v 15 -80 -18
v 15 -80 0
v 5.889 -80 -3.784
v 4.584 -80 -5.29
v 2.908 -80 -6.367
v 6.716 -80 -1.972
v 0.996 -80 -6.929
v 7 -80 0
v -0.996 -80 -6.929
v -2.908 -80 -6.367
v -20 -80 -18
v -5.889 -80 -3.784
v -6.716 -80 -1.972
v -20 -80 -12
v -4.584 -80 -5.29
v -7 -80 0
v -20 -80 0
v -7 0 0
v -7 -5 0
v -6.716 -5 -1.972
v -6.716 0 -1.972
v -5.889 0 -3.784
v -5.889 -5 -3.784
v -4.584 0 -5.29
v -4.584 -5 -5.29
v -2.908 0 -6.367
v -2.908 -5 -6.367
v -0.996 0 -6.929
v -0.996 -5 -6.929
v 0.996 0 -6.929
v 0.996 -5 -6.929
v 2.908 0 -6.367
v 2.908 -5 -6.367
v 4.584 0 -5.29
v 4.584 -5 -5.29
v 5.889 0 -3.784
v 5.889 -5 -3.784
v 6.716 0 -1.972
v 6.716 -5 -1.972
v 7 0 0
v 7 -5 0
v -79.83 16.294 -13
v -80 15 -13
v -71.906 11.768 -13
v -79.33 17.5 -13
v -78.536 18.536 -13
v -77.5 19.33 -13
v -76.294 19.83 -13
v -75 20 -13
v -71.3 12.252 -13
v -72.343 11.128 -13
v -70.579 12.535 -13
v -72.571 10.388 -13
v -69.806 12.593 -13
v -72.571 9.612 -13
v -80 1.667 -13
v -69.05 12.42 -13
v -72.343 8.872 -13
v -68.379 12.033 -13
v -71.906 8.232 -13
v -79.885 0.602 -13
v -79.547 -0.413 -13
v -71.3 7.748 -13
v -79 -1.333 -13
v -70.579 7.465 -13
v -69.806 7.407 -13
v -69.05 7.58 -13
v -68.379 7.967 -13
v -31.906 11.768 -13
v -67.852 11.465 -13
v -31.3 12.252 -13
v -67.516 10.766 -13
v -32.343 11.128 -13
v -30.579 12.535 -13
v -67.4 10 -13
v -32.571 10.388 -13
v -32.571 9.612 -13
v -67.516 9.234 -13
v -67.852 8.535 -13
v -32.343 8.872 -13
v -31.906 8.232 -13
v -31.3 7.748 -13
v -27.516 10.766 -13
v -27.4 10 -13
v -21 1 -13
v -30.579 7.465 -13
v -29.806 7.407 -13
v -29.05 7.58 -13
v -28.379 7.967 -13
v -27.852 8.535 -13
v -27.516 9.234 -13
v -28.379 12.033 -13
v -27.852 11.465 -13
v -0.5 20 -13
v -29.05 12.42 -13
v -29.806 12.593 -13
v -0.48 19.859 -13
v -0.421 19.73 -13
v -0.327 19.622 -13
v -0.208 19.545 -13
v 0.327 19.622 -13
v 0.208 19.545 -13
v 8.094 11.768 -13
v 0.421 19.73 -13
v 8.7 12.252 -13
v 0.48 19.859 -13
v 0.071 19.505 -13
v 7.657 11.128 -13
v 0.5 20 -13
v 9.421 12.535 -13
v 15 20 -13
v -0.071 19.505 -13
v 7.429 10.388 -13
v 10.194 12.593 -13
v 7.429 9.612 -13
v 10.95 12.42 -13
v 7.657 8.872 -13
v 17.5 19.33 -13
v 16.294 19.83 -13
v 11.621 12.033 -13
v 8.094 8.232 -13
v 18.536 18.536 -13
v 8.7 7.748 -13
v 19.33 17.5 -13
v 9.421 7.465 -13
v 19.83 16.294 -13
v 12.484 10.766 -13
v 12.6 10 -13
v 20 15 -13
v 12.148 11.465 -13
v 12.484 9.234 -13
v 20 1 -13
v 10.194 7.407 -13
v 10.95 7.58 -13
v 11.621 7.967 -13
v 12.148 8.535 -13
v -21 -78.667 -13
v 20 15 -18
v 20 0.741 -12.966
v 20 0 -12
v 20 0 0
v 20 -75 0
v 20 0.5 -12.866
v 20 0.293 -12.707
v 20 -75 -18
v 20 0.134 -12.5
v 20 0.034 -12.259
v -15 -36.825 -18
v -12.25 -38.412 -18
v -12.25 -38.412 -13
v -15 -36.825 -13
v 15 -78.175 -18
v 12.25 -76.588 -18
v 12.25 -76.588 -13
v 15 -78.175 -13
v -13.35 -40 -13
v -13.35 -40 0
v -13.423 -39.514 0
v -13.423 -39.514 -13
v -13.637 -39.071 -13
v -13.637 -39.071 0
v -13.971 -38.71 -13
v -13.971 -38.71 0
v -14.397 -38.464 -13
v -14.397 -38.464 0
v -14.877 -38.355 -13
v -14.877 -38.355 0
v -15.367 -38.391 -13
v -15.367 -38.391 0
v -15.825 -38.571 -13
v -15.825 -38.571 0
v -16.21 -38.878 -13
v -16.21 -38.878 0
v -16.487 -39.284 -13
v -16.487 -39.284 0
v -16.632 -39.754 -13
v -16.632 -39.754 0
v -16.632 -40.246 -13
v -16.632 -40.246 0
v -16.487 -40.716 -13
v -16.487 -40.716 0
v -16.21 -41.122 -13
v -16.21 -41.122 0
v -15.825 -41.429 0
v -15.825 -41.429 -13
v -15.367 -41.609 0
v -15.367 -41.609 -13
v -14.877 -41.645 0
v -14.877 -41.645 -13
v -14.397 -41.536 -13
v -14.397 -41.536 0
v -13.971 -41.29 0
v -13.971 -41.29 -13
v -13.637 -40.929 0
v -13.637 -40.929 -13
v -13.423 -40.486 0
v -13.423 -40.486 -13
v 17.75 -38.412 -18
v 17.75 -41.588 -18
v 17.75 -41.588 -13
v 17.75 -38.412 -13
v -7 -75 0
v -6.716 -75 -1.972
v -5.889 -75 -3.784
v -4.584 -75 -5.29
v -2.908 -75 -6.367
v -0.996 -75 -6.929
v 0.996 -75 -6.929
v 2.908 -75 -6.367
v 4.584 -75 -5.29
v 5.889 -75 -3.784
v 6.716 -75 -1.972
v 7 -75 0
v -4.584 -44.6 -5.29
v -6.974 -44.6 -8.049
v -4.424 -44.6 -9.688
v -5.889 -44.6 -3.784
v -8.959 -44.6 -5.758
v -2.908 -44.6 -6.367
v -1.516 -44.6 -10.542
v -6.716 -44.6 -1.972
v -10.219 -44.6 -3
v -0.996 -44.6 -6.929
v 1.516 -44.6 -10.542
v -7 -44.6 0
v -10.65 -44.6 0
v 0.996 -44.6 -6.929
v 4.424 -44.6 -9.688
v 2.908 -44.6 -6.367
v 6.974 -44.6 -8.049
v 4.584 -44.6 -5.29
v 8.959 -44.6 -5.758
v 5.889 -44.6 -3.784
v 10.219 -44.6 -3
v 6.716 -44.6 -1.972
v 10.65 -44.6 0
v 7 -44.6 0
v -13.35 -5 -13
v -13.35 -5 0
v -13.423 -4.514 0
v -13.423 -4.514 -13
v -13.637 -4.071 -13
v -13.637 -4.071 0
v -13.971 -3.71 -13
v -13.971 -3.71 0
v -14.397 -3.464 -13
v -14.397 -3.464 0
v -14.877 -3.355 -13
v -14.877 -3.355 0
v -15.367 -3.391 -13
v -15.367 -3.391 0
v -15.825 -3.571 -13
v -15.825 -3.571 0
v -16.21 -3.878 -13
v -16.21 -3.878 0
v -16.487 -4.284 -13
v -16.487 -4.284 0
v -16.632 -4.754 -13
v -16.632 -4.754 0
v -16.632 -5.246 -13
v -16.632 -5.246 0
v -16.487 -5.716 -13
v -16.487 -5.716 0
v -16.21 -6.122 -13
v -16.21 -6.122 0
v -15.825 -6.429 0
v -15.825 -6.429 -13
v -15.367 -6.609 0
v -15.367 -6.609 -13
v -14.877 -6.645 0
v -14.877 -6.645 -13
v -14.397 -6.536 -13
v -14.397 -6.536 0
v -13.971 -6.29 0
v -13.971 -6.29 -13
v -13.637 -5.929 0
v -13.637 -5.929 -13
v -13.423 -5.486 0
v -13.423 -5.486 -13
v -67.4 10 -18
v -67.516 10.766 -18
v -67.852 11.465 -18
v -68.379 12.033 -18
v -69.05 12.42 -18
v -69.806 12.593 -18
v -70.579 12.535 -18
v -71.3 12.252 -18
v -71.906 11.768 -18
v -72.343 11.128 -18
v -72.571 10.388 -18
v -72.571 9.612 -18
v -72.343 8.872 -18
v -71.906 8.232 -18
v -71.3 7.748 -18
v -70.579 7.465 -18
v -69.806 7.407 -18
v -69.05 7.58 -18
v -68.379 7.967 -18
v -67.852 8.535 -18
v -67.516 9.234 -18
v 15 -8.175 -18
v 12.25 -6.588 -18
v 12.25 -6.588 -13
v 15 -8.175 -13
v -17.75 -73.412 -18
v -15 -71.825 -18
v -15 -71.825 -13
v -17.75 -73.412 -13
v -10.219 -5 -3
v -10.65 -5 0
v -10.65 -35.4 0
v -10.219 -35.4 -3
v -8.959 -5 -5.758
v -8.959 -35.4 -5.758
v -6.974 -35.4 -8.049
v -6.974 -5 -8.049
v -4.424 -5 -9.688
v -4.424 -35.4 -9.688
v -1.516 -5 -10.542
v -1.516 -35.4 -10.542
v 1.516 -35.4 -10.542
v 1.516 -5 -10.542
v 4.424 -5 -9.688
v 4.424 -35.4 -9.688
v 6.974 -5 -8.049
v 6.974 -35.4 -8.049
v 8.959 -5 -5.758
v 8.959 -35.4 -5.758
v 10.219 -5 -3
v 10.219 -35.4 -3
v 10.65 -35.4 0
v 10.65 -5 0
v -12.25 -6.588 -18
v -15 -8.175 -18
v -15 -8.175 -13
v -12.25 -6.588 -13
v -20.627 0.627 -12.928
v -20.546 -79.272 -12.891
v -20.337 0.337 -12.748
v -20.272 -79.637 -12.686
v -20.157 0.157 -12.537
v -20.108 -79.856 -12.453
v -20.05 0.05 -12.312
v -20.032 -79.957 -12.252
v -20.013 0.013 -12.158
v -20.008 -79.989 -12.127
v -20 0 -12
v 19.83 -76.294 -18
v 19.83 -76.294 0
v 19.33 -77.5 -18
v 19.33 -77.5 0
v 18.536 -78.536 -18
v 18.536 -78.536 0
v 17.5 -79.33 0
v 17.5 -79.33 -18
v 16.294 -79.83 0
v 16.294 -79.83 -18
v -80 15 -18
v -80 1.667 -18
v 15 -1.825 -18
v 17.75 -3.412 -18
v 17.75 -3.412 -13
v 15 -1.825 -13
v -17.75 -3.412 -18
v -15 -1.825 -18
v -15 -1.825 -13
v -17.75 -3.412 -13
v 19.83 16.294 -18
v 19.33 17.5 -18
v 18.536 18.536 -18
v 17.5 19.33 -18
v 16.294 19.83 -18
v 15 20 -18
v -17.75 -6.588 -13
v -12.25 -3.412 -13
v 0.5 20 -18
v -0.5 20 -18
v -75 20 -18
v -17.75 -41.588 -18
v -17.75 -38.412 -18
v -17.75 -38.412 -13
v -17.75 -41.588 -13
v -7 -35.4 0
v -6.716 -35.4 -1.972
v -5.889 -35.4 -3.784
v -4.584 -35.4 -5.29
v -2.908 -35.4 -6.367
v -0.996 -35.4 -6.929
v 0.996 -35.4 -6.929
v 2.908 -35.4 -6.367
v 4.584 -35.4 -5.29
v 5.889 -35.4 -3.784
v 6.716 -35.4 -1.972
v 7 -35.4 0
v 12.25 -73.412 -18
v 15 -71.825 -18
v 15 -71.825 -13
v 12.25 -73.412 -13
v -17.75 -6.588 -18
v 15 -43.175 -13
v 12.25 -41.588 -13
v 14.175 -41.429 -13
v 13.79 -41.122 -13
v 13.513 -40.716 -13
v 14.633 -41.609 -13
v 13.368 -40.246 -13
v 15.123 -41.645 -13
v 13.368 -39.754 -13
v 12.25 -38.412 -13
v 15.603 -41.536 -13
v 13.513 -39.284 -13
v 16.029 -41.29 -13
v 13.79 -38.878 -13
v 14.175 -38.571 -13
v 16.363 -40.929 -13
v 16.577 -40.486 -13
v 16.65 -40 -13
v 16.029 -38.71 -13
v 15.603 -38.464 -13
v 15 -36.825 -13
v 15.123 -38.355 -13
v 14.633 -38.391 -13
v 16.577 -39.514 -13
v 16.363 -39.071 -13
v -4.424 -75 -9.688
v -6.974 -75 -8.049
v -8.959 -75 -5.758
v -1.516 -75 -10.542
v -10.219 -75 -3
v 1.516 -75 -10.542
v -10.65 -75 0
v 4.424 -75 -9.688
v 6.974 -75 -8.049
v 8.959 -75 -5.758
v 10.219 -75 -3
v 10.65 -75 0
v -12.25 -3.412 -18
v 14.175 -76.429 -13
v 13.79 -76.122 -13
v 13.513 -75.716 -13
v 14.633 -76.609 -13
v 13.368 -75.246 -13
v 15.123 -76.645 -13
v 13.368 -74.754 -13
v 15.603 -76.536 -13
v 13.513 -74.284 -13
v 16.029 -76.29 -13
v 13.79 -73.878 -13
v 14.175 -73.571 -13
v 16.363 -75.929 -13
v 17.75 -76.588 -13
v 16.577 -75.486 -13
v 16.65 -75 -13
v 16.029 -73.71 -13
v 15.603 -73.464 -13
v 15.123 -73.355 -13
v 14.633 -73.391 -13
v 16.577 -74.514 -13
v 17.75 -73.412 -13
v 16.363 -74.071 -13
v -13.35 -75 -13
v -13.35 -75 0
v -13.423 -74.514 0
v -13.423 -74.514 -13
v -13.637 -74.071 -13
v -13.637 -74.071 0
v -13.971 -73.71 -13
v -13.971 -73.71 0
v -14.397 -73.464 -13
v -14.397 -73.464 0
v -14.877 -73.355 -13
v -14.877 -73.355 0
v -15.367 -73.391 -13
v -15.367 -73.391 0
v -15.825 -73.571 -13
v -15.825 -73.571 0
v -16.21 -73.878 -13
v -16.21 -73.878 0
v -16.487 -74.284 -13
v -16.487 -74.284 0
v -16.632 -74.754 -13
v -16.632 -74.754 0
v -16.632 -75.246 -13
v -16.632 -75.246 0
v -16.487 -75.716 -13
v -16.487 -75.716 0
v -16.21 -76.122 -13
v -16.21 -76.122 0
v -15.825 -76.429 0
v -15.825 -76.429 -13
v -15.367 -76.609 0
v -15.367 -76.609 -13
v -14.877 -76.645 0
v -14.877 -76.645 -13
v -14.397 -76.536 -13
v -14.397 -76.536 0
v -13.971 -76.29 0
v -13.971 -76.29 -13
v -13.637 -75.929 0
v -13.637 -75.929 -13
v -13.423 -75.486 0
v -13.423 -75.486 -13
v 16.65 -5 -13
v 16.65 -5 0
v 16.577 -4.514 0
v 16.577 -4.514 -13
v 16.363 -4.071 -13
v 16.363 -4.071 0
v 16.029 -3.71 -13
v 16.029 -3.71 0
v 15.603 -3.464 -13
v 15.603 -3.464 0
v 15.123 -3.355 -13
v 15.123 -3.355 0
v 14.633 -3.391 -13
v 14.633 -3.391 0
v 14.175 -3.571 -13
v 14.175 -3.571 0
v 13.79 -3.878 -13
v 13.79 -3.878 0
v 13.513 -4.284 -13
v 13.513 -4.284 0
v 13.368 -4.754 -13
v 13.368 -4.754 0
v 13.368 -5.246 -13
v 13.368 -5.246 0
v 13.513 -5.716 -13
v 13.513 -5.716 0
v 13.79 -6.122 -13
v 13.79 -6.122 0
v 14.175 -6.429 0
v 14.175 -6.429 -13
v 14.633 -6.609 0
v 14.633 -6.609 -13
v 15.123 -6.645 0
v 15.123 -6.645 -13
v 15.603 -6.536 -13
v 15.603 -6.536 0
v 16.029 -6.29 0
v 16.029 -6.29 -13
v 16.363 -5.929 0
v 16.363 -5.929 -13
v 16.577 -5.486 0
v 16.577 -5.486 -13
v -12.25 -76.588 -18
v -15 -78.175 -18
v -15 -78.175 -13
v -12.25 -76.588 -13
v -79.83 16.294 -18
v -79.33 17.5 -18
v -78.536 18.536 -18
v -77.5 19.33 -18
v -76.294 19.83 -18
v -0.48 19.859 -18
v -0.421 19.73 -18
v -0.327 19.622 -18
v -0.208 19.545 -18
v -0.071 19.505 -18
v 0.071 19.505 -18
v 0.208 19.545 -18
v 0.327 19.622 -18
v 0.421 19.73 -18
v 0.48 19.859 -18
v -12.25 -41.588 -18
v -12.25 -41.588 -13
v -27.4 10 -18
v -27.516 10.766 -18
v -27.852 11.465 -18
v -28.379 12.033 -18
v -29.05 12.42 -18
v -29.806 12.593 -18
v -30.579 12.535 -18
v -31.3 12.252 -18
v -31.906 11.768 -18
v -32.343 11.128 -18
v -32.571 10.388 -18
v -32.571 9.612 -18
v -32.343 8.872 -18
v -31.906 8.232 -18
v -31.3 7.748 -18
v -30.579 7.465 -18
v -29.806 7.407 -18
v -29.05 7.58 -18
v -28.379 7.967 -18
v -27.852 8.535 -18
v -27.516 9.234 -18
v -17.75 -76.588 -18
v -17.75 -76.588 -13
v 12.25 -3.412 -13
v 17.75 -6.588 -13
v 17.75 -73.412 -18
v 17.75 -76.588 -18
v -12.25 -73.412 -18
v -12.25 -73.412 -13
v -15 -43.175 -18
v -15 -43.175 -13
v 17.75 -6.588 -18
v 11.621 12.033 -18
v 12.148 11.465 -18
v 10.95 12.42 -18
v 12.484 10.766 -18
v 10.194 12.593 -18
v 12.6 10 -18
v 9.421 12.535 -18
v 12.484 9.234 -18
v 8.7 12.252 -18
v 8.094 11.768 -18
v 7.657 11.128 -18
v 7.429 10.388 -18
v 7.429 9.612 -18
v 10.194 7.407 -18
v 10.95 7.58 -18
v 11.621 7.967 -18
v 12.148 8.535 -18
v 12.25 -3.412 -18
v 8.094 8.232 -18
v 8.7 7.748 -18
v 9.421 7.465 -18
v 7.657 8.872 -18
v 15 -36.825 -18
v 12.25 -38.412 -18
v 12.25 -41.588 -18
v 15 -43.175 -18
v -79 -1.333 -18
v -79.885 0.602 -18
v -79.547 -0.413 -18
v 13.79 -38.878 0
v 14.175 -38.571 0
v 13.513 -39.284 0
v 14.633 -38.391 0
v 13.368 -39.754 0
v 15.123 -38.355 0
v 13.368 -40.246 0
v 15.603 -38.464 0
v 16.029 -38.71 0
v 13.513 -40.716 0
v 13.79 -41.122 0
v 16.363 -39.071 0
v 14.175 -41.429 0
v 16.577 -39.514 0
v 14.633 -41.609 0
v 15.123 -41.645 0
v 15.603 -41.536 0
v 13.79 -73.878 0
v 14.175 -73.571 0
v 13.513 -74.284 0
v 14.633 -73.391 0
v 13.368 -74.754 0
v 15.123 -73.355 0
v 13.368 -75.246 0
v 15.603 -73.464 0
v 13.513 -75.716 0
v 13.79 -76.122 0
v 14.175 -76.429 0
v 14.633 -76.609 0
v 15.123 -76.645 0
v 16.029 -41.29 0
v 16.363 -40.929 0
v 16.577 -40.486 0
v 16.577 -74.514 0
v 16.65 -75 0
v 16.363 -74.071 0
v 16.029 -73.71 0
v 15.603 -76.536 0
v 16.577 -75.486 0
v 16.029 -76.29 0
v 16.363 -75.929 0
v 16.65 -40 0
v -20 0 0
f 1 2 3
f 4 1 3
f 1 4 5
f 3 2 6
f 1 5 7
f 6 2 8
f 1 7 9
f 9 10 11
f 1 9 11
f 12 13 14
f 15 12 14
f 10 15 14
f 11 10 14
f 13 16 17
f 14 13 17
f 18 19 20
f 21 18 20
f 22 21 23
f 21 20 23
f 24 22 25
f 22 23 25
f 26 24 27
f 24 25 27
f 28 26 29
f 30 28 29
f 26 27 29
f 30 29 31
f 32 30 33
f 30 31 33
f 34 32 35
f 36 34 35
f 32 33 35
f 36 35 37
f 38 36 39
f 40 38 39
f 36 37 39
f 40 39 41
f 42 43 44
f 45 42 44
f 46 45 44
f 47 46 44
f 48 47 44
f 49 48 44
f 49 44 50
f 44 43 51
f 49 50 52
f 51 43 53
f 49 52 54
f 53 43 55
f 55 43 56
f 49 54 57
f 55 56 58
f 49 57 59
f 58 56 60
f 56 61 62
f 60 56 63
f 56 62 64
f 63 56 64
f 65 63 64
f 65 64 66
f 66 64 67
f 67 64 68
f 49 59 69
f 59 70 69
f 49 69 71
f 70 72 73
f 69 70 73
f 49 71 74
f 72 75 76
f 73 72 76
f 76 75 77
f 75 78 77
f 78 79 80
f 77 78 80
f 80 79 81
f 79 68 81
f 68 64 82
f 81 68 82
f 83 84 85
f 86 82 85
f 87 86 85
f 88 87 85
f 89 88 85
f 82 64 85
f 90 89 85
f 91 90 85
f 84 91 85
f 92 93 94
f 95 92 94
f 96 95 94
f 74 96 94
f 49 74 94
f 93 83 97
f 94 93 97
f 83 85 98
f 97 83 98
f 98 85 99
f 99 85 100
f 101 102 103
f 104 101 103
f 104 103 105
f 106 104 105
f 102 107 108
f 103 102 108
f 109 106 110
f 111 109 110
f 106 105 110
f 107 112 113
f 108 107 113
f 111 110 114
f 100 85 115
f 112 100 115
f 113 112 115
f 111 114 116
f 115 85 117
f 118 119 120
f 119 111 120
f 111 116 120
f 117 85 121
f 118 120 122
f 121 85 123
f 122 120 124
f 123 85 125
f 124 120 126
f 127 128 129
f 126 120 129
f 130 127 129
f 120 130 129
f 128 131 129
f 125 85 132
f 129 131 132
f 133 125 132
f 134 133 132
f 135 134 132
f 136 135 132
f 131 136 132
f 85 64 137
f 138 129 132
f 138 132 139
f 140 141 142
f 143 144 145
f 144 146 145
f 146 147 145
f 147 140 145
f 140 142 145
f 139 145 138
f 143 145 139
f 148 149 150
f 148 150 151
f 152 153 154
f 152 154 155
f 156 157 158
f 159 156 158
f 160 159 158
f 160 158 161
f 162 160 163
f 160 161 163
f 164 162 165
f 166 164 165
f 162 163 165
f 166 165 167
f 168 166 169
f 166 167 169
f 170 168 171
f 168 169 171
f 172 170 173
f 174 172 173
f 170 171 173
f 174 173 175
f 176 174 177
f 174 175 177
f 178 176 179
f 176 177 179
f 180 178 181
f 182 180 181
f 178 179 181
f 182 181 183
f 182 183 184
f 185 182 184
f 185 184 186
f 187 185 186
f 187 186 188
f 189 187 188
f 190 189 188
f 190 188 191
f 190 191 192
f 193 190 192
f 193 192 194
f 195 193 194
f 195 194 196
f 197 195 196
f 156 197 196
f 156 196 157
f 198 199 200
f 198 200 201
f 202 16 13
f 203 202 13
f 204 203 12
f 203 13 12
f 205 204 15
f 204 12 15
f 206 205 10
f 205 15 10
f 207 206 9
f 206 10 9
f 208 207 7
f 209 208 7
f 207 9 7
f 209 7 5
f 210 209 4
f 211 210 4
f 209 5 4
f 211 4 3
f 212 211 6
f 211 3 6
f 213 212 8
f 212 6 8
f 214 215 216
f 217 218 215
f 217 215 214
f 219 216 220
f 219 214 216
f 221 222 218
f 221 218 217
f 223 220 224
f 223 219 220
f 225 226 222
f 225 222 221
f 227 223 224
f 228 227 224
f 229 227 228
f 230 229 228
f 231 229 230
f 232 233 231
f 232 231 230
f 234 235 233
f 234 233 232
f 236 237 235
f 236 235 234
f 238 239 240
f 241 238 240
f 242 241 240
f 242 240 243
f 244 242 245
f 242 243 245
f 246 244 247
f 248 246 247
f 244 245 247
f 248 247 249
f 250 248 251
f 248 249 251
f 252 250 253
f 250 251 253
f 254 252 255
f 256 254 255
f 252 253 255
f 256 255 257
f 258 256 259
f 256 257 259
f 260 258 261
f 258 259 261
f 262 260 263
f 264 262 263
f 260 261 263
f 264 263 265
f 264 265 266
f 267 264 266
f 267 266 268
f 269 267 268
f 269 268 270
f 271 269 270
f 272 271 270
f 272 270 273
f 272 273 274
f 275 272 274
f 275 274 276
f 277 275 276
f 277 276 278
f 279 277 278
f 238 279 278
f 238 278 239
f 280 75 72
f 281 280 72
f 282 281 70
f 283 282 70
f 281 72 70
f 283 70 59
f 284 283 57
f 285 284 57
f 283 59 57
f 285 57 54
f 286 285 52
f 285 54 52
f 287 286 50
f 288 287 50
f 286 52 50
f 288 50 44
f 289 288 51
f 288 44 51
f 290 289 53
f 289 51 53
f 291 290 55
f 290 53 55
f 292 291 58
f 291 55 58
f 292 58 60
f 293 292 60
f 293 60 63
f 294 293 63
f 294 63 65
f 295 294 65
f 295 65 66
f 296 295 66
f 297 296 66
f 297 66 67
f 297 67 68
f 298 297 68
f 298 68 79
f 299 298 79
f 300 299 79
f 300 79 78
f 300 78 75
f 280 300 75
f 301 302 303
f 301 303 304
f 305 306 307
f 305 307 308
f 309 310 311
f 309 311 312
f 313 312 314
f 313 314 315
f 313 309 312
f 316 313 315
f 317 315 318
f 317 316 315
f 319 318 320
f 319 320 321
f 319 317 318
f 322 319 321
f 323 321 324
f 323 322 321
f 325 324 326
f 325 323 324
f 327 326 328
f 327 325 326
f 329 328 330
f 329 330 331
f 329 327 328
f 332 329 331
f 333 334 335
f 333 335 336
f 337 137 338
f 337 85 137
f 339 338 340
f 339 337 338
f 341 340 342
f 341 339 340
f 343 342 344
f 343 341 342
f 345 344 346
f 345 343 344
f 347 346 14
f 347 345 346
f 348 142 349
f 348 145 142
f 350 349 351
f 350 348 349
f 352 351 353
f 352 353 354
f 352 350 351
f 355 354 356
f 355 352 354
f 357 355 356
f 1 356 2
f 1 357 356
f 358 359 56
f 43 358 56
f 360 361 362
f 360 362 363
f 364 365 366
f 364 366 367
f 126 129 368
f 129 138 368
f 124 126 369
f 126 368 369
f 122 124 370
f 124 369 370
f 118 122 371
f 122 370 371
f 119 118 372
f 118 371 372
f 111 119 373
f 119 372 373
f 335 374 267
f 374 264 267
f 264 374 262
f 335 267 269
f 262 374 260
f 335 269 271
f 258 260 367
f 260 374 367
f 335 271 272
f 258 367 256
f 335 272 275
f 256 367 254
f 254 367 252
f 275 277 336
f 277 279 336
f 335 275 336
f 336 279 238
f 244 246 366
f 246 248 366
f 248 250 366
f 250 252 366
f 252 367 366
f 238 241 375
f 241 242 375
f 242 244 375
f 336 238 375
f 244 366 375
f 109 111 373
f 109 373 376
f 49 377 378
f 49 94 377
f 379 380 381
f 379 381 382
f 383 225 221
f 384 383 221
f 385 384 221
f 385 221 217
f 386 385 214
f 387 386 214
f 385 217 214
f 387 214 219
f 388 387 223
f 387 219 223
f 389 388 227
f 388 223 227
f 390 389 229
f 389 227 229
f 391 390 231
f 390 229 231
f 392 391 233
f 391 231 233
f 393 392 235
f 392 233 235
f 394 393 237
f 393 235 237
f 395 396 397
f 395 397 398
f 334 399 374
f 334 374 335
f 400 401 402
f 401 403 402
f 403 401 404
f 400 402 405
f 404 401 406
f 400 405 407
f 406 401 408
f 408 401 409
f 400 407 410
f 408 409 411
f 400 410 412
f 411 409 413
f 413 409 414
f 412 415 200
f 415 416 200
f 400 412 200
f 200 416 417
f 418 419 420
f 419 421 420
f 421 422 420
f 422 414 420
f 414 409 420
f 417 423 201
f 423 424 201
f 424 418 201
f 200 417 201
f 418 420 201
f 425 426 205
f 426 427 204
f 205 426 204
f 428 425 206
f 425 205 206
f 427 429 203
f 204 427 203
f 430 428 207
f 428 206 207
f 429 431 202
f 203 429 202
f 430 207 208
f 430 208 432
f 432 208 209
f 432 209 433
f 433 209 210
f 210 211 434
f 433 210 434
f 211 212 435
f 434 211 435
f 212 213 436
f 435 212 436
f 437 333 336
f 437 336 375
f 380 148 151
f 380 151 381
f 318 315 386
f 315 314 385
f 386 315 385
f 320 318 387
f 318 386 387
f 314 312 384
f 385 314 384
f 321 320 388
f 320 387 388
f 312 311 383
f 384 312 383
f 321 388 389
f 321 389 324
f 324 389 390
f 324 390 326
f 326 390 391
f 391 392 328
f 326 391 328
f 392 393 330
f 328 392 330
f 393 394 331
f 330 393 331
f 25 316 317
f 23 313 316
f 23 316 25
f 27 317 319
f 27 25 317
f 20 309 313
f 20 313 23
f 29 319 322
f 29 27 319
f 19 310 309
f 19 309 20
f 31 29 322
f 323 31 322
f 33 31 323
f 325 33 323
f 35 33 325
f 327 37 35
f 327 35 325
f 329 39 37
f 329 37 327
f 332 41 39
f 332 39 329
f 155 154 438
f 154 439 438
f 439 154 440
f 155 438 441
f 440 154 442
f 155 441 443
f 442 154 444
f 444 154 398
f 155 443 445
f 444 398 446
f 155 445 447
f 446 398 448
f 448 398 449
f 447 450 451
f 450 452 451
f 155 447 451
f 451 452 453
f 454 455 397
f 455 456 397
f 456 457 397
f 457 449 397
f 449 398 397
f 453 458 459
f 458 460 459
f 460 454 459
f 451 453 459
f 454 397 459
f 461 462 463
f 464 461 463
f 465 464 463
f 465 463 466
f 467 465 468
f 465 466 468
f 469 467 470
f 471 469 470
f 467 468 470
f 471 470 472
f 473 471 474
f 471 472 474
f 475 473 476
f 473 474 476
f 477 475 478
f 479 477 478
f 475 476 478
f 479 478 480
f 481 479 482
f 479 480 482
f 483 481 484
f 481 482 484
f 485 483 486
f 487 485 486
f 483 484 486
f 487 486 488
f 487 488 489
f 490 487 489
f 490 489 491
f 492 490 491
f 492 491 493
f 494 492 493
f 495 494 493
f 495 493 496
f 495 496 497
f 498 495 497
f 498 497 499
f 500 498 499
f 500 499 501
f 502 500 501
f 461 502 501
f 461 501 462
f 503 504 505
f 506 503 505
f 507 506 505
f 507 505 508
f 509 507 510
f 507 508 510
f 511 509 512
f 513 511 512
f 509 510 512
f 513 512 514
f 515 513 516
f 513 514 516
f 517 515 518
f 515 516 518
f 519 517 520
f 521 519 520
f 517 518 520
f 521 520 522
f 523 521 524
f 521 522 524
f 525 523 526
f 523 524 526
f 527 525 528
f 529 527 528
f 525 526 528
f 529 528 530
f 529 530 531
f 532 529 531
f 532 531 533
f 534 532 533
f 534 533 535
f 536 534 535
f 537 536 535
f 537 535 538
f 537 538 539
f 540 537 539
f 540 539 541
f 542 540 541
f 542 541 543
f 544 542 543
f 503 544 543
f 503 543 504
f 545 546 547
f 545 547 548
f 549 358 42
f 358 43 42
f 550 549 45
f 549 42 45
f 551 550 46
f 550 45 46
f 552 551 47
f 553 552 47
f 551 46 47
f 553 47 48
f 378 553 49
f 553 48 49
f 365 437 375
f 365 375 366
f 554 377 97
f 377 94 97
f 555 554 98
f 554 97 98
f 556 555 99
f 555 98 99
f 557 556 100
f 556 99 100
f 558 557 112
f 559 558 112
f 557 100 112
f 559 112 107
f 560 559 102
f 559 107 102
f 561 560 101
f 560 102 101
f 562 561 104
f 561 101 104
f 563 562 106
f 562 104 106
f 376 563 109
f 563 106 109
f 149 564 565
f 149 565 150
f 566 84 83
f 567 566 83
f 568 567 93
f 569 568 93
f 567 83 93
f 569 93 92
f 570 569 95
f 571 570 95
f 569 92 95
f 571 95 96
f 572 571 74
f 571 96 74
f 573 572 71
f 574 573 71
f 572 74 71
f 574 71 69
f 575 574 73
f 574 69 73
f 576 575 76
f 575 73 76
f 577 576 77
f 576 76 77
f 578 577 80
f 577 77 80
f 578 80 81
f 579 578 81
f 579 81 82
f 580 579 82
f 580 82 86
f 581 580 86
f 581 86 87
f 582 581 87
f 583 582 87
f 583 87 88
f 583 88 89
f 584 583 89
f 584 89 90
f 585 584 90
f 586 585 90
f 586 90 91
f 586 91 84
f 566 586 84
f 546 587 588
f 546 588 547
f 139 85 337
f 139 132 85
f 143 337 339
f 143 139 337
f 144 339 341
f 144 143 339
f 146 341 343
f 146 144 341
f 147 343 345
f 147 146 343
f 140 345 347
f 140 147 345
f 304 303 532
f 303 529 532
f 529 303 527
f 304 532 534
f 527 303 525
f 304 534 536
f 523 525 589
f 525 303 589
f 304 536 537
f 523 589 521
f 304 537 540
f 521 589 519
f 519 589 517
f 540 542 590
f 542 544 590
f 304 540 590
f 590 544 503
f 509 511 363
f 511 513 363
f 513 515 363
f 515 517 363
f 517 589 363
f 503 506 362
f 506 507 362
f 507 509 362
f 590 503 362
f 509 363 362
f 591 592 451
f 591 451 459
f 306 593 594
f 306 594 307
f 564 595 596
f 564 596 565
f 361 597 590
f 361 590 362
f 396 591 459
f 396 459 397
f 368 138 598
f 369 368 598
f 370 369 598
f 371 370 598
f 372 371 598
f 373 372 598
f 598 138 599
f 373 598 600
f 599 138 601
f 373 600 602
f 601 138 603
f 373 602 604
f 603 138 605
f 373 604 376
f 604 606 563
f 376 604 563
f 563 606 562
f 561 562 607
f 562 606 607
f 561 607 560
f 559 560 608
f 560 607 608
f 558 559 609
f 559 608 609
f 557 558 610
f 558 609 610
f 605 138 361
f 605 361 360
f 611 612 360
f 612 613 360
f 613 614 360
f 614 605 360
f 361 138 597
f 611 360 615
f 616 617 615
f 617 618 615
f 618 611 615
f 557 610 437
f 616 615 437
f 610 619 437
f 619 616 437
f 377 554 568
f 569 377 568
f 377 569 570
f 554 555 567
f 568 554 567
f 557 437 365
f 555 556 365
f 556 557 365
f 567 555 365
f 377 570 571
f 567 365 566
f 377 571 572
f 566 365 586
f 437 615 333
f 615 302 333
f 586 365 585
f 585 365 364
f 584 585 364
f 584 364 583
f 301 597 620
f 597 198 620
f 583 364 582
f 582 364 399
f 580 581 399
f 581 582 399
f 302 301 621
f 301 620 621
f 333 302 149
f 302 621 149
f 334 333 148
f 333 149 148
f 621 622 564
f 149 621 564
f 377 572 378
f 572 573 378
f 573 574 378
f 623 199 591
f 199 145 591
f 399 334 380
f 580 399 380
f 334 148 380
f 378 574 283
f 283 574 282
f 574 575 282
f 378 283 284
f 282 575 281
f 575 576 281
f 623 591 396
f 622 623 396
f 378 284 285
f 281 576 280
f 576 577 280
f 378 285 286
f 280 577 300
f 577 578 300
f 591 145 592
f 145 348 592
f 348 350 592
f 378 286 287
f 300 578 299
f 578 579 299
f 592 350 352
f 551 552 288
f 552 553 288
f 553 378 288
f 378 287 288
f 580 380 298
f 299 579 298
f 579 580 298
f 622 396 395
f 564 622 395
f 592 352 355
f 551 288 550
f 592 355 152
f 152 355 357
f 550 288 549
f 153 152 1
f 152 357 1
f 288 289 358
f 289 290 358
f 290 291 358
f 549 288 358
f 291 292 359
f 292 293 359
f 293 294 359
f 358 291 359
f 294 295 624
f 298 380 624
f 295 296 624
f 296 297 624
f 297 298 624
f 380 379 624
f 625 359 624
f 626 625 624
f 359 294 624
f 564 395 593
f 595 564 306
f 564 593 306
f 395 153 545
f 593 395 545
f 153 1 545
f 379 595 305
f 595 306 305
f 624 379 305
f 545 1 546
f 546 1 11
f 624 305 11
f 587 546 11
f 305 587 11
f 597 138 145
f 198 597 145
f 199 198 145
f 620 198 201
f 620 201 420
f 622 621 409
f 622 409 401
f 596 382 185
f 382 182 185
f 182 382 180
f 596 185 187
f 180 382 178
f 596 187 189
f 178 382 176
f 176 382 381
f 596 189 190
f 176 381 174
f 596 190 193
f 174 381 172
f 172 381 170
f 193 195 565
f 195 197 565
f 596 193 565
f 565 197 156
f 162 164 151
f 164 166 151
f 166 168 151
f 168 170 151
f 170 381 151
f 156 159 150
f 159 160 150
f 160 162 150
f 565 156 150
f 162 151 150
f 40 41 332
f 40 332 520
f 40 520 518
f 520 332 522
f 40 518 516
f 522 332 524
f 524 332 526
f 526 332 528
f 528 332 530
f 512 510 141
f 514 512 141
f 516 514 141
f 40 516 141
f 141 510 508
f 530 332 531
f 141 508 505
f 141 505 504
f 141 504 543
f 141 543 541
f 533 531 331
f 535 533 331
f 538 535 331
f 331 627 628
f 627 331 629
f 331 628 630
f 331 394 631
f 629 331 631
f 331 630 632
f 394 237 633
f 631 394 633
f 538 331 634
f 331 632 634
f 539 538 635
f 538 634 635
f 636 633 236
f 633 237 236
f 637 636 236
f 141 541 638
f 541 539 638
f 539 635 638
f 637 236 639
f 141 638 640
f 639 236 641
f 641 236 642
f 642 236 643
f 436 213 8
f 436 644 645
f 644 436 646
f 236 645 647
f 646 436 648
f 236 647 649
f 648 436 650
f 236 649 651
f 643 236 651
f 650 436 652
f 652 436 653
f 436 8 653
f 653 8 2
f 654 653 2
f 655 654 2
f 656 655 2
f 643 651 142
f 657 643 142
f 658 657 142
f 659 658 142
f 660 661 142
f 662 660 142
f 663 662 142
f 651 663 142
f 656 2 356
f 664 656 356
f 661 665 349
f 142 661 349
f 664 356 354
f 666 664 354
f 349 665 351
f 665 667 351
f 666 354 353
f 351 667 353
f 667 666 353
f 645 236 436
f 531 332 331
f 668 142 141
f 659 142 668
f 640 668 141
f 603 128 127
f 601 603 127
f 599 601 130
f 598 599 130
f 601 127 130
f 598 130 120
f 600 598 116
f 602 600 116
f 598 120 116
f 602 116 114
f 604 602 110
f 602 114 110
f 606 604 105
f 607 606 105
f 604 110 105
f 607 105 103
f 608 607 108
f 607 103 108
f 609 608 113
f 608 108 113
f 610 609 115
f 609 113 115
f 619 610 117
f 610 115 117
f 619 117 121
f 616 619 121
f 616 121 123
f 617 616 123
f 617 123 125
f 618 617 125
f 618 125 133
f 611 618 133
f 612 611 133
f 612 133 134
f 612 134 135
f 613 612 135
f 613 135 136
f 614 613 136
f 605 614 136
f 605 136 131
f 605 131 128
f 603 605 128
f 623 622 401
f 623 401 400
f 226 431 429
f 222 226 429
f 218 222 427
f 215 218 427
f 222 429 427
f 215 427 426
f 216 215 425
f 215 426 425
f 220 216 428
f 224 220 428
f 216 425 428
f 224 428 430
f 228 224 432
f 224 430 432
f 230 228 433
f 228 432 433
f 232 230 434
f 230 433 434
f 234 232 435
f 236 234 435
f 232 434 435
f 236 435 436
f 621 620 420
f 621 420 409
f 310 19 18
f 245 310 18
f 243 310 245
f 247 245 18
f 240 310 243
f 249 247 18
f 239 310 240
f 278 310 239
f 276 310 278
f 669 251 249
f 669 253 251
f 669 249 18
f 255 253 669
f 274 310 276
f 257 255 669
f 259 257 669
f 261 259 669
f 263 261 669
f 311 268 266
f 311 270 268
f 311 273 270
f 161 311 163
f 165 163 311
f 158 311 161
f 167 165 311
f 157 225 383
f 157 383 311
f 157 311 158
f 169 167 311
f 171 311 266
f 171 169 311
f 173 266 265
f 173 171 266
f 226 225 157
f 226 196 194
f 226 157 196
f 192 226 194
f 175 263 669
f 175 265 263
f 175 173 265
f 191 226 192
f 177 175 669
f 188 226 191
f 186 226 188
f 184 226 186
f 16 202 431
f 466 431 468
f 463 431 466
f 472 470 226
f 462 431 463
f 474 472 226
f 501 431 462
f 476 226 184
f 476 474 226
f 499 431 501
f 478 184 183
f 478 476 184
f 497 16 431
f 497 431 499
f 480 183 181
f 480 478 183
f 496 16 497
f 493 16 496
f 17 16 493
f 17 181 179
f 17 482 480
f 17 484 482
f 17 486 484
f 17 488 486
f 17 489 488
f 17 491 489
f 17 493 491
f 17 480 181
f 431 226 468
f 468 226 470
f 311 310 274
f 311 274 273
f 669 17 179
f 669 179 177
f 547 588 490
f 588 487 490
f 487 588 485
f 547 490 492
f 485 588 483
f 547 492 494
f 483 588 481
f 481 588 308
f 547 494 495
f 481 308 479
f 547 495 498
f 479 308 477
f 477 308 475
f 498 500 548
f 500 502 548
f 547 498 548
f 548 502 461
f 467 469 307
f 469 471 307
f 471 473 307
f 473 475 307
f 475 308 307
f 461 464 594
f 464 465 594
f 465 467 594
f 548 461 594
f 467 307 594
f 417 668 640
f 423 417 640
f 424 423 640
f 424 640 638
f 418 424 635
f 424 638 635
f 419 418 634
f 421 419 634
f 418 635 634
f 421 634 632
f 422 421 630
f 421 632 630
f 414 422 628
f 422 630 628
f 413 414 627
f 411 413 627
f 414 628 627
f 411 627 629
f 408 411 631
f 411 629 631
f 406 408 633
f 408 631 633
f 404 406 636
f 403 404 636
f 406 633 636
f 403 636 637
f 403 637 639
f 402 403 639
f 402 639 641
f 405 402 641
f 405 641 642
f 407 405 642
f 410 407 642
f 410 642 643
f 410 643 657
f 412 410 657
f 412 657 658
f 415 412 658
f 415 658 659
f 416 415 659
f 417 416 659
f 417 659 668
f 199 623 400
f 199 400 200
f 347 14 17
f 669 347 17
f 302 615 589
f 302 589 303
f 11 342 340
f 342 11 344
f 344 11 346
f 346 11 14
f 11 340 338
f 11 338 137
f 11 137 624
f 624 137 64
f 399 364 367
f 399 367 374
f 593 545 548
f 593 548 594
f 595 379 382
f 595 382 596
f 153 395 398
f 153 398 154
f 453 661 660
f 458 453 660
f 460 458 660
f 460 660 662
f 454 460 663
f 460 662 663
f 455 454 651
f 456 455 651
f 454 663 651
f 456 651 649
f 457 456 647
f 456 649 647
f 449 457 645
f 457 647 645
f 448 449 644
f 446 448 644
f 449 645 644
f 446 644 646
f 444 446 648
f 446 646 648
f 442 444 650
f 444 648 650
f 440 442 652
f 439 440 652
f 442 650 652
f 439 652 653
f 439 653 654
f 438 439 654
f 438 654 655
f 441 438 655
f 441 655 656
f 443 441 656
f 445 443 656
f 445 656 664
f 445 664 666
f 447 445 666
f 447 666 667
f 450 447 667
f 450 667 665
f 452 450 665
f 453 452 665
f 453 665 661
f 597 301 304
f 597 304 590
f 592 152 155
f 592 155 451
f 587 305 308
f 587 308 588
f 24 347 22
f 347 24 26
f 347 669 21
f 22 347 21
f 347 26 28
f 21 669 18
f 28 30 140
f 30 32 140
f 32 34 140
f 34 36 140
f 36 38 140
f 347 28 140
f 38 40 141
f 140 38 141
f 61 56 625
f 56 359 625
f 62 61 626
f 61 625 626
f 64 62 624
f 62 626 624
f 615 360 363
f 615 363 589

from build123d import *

# Parameters (mm, degrees)
PAD_DEPTH       = 80
PAD_DEPTH_BACK  = 20
SKETCH001_R     = 2.6
SKETCH001_R_2   = 1.65
SKETCH001_R_3   = 0.5
POCKET_DEPTH    = 18.001
SKETCH002_W     = 66.71416
SKETCH002_H     = 42.248775
POCKET001_DEPTH = 13
SKETCH003_R     = 10.65
POCKET002_DEPTH = 30.4
SKETCH004_R     = 10.65
POCKET003_DEPTH = 30.4
POCKET004_DEPTH = 5
FILLET_R        = 5
FILLET001_R     = 1


with BuildPart() as part:
    # Sketch → Pad (new body, two sides)
    with BuildSketch(Plane.XZ) as pad_sk:
        with BuildLine():
            Line((-80, -18), (-80, -13))
            Line((-80, -13), (-20, -13))
            Line((-20, -13), (-20, 0))
            Line((-7, 0), (-20, 0))
            ThreePointArc((-7, 0), (0, -7), (7, 0))
            Line((7, 0), (20, 0))
            Line((20, 0), (20, -18))
            Line((20, -18), (-80, -18))
        make_face()
    extrude(amount=PAD_DEPTH)
    extrude(pad_sk.sketch, amount=-PAD_DEPTH_BACK)

    # Sketch001 → Pocket (cut, through all)
    with BuildSketch(Plane.XY):
        with Locations((-70, 10)):
            Circle(SKETCH001_R)
        with Locations((-30, 10)):
            Circle(SKETCH001_R)
        with Locations((10, 10)):
            Circle(SKETCH001_R)
        with Locations((-15, -5)):
            Circle(SKETCH001_R_2)
        with Locations((-15, -40)):
            Circle(SKETCH001_R_2)
        with Locations((-15, -75)):
            Circle(SKETCH001_R_2)
        with Locations((15, -5)):
            Circle(SKETCH001_R_2)
        with Locations((15, -40)):
            Circle(SKETCH001_R_2)
        with Locations((15, -75)):
            Circle(SKETCH001_R_2)
        with Locations((0, 20)):
            Circle(SKETCH001_R_3)
        Polygon((-80, 0), (-80, -80), (-20, -80), align=None)
    extrude(amount=-POCKET_DEPTH, mode=Mode.SUBTRACT)

    # Sketch002 → Pocket001 (cut)
    with BuildSketch(Plane.XY):
        with Locations((0, 21.124387)):
            Rectangle(SKETCH002_W, SKETCH002_H)
    extrude(amount=-POCKET001_DEPTH, mode=Mode.SUBTRACT)

    # Sketch003 (on DatumPlane) → Pocket002 (cut)
    with BuildSketch(Plane.XZ.offset(5)):
        Circle(SKETCH003_R)
    extrude(amount=POCKET002_DEPTH, mode=Mode.SUBTRACT)

    # Sketch004 (on DatumPlane) → Pocket003 (cut)
    with BuildSketch(Plane.XZ.offset(75)):
        Circle(SKETCH004_R)
    extrude(amount=-POCKET003_DEPTH, mode=Mode.SUBTRACT)

    # Sketch005 (on DatumPlane) → Pocket004 (cut)
    with BuildSketch(Plane.XY.offset(-18)):
        Polygon((-12.25, -6.587713), (-12.25, -3.412287), (-15, -1.824574), (-17.75, -3.412287), (-17.75, -6.587713), (-15, -8.175426), align=None)
        Polygon((17.75, -6.587713), (17.75, -3.412287), (15, -1.824574), (12.25, -3.412287), (12.25, -6.587713), (15, -8.175426), align=None)
        Polygon((-12.25, -41.587713), (-12.25, -38.412287), (-15, -36.824574), (-17.75, -38.412287), (-17.75, -41.587713), (-15, -43.175426), align=None)
        Polygon((17.75, -41.587713), (17.75, -38.412287), (15, -36.824574), (12.25, -38.412287), (12.25, -41.587713), (15, -43.175426), align=None)
        Polygon((-12.25, -76.587713), (-12.25, -73.412287), (-15, -71.824574), (-17.75, -73.412287), (-17.75, -76.587713), (-15, -78.175426), align=None)
        Polygon((17.75, -76.587713), (17.75, -73.412287), (15, -71.824574), (12.25, -73.412287), (12.25, -76.587713), (15, -78.175426), align=None)
    extrude(amount=POCKET004_DEPTH, mode=Mode.SUBTRACT)

    # Fillet
    fillet_edges = [part.edges().sort_by_distance(p)[0] for p in [
        (-80, 20, -15.5),
        (-80, 0, -15.5),
        (20, -80, -9),
        (20, 20, -15.5),
    ]]
    fillet(fillet_edges, radius=FILLET_R)

    # Fillet001
    fillet001_edges = [part.edges().sort_by_distance(p)[0] for p in [
        (-20, -40, -13),
        (0, 0, -13),
    ]]
    fillet(fillet001_edges, radius=FILLET001_R)


solid = part.part
